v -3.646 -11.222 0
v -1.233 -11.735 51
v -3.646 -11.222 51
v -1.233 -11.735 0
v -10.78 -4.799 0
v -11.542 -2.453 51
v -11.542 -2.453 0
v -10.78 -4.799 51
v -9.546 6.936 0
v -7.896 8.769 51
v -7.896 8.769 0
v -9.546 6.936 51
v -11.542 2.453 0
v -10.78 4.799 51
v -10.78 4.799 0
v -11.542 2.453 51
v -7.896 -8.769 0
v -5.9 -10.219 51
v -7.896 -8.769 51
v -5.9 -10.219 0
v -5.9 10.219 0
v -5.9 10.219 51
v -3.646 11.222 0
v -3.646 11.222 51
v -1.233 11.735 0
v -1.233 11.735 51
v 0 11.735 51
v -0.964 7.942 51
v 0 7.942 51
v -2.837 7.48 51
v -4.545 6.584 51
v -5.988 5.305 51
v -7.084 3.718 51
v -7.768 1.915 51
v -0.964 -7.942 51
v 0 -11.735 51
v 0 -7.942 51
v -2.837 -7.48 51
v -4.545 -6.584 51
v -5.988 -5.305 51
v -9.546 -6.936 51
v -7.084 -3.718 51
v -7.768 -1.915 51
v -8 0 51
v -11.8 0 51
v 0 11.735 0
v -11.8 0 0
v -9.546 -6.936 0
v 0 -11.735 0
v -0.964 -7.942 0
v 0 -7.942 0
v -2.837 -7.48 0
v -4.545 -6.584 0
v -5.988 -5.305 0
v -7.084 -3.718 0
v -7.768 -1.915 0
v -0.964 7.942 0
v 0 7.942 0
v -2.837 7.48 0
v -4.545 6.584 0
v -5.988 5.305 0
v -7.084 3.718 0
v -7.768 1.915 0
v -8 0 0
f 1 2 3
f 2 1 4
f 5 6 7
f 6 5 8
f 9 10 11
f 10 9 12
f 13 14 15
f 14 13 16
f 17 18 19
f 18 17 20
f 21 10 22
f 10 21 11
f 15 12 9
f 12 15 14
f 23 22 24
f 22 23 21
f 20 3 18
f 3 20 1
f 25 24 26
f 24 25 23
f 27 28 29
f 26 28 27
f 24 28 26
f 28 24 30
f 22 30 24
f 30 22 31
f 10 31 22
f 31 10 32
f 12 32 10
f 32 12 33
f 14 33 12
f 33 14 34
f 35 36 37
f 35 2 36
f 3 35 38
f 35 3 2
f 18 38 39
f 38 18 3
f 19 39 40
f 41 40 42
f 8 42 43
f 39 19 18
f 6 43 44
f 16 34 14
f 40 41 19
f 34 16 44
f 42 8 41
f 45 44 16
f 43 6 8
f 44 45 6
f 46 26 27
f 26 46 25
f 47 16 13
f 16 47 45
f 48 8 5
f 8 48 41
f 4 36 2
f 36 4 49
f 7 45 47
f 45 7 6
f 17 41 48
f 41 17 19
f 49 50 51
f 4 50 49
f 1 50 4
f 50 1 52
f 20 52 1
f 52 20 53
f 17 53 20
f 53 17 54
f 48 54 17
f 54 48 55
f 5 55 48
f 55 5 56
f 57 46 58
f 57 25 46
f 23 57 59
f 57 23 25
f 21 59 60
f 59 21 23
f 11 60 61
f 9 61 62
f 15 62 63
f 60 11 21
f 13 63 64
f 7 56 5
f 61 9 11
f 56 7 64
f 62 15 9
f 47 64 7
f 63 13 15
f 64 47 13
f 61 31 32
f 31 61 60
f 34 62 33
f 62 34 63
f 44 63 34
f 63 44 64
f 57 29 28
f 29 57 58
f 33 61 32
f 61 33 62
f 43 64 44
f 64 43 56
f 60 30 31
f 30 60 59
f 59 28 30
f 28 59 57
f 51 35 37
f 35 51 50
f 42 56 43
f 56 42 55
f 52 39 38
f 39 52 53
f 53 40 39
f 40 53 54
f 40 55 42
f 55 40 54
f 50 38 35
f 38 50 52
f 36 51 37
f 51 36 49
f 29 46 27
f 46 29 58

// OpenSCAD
height = 51;
inner_diam = 8;
outer_diam = 11.8;

difference()
{
    translate([0, 0, height/2])
        cylinder(h=height, r1=outer_diam, r2=outer_diam, center=true);
    
    translate([0, 0, height/2])
        cylinder(h=height, r1=inner_diam, r2=inner_diam, center=true);
    
    translate([0, -outer_diam, 0])
        cube(size = [2*outer_diam, 2*outer_diam, height], center=false);
    
    
}
